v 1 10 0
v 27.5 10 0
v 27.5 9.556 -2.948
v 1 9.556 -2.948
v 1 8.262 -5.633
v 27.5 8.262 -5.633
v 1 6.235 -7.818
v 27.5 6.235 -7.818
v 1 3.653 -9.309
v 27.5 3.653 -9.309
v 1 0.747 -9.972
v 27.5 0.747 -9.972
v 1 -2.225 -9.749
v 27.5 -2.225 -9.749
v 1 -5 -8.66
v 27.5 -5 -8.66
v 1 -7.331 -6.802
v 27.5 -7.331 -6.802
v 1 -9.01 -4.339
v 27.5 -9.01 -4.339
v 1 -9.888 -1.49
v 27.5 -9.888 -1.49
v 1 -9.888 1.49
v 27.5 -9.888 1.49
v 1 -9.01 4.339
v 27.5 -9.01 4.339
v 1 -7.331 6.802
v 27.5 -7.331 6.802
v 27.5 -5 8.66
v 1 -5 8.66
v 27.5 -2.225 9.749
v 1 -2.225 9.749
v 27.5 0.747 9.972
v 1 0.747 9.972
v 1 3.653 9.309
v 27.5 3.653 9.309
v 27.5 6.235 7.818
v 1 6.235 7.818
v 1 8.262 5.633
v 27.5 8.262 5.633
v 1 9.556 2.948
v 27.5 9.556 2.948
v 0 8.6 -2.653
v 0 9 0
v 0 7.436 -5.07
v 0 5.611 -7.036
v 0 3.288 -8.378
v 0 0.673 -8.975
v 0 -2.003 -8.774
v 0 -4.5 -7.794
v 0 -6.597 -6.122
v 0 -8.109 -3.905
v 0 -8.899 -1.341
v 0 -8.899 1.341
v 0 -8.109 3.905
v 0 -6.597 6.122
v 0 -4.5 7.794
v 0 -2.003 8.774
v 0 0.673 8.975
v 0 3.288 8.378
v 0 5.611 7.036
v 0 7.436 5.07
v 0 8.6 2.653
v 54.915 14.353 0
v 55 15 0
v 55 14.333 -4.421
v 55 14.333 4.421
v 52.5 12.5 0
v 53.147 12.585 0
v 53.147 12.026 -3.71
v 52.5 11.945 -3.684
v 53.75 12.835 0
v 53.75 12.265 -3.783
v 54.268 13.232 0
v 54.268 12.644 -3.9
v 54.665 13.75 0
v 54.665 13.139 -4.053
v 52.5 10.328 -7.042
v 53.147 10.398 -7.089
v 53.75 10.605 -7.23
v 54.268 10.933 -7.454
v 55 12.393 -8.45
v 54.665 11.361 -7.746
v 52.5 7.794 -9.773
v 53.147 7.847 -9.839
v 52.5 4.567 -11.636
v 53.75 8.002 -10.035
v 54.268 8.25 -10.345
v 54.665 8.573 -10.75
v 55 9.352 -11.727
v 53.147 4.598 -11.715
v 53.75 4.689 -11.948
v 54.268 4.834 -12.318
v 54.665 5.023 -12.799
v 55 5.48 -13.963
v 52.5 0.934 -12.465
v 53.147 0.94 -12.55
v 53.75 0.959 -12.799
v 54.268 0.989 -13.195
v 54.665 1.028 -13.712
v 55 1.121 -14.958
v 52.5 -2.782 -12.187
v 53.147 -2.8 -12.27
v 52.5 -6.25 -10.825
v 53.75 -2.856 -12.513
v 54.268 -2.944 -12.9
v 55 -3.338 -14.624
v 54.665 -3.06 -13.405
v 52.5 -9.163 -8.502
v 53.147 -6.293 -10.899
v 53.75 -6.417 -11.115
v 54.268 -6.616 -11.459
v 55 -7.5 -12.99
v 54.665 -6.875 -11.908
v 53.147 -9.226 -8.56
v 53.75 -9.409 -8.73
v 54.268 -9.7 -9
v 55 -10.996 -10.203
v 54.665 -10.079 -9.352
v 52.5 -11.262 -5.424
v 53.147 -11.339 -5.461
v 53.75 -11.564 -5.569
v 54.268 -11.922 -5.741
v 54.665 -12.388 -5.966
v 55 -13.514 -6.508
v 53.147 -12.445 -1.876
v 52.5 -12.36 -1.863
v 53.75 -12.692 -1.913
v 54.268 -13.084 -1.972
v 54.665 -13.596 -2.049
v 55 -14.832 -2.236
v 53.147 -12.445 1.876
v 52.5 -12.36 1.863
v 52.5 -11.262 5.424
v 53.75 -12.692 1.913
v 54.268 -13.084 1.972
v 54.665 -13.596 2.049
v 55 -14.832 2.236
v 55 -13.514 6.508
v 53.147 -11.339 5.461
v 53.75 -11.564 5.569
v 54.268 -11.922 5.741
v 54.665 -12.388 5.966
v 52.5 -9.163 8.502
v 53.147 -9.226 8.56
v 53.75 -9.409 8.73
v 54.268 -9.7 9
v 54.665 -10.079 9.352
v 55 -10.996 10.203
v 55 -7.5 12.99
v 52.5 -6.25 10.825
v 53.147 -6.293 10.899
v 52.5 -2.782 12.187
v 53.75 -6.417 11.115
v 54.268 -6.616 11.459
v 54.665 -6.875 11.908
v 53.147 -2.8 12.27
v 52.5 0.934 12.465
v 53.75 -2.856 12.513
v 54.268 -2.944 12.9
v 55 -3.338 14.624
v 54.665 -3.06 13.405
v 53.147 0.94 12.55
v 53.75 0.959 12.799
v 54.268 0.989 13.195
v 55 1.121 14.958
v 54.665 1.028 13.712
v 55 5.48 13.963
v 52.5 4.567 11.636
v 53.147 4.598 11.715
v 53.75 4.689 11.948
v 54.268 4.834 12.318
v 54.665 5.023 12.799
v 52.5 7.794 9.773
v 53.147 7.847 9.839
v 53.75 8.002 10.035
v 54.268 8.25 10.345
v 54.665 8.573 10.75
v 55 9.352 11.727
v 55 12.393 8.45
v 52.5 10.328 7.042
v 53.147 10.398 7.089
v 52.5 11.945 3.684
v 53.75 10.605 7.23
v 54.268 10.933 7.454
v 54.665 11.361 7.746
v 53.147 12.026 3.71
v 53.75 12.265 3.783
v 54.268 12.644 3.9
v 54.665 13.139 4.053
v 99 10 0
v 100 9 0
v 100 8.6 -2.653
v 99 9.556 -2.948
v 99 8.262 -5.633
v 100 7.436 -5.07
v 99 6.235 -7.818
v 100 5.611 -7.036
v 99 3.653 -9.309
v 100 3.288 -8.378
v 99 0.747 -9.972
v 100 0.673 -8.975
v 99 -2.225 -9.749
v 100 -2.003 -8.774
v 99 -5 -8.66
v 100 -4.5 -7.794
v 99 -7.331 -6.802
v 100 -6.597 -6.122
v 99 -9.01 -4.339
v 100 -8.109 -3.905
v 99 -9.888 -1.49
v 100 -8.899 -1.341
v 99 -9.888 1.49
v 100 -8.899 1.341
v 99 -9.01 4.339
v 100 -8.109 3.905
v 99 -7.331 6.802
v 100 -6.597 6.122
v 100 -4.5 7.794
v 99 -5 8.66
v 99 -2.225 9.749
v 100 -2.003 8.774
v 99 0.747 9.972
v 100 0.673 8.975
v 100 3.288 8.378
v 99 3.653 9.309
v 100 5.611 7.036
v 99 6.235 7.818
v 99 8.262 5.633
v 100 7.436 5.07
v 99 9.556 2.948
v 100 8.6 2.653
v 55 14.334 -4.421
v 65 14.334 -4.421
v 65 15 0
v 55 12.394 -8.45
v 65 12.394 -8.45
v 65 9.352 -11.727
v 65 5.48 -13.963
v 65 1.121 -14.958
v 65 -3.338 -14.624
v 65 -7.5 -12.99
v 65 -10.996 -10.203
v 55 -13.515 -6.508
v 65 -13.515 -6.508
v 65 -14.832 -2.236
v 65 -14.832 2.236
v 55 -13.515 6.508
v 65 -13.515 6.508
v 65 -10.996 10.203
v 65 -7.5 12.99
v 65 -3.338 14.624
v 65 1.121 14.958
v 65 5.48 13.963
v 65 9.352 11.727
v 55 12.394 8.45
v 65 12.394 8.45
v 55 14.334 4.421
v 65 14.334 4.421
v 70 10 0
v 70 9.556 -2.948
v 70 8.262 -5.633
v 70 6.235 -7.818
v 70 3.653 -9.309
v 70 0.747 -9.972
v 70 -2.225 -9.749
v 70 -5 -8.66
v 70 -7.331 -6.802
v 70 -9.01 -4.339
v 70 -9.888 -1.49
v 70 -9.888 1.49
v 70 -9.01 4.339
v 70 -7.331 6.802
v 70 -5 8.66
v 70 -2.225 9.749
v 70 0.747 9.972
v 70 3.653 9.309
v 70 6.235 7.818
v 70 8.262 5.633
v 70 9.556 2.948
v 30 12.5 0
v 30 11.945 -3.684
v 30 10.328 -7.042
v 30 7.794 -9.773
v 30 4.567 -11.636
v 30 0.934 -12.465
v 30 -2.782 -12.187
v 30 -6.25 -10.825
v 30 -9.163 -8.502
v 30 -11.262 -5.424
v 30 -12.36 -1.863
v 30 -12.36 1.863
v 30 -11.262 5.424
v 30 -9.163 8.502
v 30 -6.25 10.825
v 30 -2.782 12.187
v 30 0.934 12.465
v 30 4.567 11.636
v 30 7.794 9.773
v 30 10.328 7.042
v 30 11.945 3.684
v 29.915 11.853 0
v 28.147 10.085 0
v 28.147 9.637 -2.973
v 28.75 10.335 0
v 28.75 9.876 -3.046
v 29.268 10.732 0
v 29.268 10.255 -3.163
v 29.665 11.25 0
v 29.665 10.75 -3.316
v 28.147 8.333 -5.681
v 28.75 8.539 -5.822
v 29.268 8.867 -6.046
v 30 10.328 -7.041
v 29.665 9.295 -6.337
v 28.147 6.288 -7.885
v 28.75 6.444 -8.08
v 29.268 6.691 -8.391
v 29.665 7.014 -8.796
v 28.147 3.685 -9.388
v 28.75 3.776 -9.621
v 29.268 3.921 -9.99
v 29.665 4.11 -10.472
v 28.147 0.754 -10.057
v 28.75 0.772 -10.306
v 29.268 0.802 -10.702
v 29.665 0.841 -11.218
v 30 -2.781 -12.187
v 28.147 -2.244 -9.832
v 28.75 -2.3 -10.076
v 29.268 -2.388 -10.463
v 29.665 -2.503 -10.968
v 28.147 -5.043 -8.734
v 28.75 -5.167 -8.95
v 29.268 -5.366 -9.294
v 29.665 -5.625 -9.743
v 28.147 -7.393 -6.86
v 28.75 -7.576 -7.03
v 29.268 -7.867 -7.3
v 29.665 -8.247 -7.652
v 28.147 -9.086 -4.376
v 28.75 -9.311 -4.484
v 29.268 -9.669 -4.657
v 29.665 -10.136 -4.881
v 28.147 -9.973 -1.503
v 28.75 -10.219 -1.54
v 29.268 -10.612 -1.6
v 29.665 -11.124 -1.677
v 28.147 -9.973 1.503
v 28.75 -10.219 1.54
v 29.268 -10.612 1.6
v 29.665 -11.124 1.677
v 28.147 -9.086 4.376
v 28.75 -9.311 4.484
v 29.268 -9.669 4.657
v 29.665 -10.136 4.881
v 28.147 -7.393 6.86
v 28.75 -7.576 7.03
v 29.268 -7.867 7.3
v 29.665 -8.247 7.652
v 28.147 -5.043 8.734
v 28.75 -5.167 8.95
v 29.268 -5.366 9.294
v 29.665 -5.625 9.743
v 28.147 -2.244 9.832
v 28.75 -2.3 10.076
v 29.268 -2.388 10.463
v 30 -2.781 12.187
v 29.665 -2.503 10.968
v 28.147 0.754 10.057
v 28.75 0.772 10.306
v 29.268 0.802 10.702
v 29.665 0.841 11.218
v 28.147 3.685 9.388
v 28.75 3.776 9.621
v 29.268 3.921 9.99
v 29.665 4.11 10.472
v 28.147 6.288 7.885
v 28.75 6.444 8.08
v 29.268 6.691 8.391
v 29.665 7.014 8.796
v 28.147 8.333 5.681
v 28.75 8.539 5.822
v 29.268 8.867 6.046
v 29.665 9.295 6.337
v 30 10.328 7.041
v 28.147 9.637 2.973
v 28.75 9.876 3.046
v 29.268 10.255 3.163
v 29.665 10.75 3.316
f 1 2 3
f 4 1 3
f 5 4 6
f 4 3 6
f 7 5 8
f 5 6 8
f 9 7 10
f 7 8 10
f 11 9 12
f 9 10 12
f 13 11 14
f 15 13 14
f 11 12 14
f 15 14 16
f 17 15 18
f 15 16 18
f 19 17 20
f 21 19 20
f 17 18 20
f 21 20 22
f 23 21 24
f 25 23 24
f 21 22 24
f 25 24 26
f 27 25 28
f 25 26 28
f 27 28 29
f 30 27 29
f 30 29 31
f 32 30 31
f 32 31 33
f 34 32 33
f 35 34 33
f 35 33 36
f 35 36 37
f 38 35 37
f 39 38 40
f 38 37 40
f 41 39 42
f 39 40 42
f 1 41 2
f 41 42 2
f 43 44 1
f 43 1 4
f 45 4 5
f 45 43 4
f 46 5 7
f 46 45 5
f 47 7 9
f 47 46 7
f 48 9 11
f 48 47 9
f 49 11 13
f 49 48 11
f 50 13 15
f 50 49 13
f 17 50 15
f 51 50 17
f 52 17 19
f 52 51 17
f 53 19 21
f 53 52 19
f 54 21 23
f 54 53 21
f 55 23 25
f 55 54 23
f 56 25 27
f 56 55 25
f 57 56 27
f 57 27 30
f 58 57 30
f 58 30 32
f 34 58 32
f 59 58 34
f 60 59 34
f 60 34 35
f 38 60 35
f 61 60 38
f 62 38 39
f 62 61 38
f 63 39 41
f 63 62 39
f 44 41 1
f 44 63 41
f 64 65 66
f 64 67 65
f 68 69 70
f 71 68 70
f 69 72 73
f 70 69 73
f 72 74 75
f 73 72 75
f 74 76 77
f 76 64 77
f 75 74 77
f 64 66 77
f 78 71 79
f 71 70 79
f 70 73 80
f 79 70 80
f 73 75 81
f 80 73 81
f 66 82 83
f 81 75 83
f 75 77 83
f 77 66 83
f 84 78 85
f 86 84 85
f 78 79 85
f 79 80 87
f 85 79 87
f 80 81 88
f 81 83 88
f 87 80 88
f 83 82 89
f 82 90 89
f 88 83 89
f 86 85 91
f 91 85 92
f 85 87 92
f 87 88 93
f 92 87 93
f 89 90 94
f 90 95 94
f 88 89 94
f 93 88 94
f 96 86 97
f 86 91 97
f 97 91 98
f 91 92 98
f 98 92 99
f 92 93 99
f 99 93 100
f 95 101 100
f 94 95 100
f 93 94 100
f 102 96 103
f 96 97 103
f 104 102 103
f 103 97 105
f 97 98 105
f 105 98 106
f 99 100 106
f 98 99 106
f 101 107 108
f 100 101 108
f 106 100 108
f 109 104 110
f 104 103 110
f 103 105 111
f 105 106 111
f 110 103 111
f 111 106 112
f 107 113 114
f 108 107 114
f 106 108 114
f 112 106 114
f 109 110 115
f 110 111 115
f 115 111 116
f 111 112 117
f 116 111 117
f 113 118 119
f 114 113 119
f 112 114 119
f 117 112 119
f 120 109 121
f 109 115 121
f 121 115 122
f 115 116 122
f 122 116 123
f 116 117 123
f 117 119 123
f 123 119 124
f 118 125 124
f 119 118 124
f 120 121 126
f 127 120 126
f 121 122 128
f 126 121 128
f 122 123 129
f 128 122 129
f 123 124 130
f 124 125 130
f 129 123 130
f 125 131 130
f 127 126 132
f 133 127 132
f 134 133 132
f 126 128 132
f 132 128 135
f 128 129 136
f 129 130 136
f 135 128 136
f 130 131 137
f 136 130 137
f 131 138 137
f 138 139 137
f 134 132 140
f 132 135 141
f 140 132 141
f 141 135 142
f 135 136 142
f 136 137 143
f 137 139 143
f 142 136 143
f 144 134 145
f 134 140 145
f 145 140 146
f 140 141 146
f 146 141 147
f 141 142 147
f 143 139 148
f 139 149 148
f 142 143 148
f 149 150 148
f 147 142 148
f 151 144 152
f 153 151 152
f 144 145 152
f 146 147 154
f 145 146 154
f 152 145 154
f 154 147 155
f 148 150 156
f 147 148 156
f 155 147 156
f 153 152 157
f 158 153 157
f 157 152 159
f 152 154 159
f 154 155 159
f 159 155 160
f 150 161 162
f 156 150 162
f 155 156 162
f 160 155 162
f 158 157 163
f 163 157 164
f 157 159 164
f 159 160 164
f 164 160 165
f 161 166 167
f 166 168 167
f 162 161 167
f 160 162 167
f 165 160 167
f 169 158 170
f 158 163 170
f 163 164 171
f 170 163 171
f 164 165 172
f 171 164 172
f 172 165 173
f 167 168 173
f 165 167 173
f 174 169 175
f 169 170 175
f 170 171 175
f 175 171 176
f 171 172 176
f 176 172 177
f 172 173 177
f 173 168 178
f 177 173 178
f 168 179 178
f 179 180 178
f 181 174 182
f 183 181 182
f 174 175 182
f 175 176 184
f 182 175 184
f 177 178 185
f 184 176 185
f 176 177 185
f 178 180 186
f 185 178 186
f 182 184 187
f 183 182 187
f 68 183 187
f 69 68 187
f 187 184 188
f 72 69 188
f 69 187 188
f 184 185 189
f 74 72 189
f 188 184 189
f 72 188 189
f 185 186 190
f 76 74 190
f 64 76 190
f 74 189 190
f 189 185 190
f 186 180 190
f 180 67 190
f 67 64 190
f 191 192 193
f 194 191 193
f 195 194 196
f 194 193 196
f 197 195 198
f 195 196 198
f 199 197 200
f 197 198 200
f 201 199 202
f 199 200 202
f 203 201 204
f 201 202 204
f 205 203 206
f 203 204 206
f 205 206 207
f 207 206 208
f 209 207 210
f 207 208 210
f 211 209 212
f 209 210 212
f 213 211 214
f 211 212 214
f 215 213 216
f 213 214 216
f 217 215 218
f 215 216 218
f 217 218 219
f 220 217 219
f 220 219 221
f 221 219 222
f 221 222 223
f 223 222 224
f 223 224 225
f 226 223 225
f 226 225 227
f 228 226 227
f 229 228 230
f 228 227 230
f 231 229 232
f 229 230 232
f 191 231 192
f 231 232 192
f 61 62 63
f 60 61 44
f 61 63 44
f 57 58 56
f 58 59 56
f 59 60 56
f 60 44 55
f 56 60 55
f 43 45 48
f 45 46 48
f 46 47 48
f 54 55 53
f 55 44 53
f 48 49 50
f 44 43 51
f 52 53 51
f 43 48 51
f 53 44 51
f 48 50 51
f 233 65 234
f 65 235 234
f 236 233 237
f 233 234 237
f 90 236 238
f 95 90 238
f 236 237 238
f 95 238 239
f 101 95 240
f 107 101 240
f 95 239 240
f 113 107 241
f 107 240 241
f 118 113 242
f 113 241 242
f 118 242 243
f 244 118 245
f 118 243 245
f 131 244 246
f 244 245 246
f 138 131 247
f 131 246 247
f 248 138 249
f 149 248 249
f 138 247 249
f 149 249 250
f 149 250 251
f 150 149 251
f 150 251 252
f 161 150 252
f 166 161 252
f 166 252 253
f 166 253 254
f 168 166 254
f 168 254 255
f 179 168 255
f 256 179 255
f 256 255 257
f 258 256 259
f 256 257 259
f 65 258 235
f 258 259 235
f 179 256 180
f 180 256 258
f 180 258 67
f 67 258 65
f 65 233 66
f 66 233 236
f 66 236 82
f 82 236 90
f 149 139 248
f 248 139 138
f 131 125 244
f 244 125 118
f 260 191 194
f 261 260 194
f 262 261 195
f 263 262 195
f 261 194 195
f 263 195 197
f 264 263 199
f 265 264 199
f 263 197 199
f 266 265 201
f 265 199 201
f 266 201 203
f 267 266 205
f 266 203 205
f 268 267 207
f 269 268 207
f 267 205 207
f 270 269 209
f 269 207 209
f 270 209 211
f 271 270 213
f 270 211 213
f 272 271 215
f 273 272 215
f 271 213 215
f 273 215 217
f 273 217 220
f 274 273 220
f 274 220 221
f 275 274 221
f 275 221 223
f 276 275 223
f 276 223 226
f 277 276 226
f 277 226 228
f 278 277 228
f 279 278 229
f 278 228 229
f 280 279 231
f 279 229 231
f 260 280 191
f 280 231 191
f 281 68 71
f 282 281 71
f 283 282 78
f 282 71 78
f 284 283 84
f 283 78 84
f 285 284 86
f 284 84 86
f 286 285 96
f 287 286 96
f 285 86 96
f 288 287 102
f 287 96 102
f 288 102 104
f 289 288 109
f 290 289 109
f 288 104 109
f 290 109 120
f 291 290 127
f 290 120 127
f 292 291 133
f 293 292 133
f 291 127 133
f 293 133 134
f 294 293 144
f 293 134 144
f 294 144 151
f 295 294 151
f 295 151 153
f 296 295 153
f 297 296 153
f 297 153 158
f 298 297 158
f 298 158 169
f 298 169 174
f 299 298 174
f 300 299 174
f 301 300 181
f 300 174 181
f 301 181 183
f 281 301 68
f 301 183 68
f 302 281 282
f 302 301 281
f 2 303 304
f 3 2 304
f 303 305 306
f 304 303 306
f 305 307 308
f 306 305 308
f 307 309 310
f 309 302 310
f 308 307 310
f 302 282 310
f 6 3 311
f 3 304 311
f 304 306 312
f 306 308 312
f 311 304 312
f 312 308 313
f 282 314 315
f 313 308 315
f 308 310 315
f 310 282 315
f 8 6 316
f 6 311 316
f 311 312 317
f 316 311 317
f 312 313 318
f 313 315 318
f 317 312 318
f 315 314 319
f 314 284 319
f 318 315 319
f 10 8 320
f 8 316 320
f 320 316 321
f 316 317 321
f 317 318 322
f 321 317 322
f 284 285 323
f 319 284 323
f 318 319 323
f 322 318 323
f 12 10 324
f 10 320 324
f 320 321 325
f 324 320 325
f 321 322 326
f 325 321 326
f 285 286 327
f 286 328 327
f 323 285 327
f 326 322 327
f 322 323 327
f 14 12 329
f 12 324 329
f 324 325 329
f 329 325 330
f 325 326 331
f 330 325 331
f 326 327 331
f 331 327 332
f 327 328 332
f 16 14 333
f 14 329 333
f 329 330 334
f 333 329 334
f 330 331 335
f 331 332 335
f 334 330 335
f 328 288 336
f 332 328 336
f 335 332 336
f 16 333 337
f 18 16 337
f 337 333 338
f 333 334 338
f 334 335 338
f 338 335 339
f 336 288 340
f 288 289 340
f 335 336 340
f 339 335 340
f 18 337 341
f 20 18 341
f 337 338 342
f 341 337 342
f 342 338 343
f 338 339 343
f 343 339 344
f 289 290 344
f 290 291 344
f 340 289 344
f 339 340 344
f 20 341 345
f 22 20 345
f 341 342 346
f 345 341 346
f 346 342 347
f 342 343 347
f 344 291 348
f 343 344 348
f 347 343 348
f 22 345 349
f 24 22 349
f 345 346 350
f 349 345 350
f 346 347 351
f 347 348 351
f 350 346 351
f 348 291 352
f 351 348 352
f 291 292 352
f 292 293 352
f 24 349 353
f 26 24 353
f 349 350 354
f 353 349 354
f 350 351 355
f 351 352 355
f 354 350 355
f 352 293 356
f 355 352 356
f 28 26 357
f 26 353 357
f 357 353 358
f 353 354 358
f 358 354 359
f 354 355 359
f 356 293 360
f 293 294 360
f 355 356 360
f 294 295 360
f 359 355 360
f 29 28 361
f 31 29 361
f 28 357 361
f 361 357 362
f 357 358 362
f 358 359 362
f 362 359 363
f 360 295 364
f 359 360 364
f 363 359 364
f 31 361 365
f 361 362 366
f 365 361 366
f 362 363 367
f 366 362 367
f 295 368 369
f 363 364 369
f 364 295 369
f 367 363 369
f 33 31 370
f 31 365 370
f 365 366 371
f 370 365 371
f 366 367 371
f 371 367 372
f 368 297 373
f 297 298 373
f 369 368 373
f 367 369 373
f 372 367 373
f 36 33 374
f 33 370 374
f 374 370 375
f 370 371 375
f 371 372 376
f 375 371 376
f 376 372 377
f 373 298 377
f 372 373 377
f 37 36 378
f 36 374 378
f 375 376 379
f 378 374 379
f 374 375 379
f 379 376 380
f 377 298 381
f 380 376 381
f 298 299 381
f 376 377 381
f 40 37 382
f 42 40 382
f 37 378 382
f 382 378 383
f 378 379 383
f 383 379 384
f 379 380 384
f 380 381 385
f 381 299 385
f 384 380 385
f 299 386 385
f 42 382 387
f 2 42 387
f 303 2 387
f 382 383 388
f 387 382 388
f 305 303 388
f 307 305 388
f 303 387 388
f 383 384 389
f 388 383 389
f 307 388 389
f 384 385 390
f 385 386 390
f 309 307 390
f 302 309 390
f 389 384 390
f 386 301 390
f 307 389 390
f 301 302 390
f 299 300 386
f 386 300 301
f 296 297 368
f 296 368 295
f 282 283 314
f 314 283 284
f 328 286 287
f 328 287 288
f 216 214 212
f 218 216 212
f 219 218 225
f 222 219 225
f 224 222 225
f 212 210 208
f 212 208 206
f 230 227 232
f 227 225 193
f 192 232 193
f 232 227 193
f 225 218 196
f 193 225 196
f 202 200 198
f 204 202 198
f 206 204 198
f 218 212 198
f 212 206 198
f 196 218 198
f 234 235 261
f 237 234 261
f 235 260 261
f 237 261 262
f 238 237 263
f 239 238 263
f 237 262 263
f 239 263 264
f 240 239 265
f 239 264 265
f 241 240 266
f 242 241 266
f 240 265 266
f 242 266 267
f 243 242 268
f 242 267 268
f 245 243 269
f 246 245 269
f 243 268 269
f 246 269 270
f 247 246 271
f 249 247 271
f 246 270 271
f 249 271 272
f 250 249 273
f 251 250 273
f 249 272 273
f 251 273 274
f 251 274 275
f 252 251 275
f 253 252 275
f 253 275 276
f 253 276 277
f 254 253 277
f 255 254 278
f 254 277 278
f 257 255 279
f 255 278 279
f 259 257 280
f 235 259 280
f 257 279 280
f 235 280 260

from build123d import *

# Parameters (mm, degrees)
FILLET1_R     = 2.5
CHAMFER1_SIZE = 1


with BuildPart() as part:
    # Sketch1 → Revolve1 (revolve)
    with BuildSketch(Plane.XY):
        Polygon((0, 0), (0, 10), (30, 10), (30, 12.5), (55, 12.5), (55, 15), (65, 15), (70, 10), (100, 10), (100, 0), align=None)
    revolve(axis=Axis((100, 0, 0), (-1, 0, 0)))

    # Fillet1
    fillet1_edges = [part.edges().sort_by_distance(p)[0] for p in [
        (30, -10, 0),
        (55, -12.5, 0),
    ]]
    fillet(fillet1_edges, radius=FILLET1_R - 0.0001)  # a hair under: the kernel refuses the full size

    # Chamfer1
    chamfer1_edges = [part.edges().sort_by_distance(p)[0] for p in [
        (0, -10, 0),
        (100, -10, 0),
    ]]
    chamfer(chamfer1_edges, length=CHAMFER1_SIZE)


solid = part.part
